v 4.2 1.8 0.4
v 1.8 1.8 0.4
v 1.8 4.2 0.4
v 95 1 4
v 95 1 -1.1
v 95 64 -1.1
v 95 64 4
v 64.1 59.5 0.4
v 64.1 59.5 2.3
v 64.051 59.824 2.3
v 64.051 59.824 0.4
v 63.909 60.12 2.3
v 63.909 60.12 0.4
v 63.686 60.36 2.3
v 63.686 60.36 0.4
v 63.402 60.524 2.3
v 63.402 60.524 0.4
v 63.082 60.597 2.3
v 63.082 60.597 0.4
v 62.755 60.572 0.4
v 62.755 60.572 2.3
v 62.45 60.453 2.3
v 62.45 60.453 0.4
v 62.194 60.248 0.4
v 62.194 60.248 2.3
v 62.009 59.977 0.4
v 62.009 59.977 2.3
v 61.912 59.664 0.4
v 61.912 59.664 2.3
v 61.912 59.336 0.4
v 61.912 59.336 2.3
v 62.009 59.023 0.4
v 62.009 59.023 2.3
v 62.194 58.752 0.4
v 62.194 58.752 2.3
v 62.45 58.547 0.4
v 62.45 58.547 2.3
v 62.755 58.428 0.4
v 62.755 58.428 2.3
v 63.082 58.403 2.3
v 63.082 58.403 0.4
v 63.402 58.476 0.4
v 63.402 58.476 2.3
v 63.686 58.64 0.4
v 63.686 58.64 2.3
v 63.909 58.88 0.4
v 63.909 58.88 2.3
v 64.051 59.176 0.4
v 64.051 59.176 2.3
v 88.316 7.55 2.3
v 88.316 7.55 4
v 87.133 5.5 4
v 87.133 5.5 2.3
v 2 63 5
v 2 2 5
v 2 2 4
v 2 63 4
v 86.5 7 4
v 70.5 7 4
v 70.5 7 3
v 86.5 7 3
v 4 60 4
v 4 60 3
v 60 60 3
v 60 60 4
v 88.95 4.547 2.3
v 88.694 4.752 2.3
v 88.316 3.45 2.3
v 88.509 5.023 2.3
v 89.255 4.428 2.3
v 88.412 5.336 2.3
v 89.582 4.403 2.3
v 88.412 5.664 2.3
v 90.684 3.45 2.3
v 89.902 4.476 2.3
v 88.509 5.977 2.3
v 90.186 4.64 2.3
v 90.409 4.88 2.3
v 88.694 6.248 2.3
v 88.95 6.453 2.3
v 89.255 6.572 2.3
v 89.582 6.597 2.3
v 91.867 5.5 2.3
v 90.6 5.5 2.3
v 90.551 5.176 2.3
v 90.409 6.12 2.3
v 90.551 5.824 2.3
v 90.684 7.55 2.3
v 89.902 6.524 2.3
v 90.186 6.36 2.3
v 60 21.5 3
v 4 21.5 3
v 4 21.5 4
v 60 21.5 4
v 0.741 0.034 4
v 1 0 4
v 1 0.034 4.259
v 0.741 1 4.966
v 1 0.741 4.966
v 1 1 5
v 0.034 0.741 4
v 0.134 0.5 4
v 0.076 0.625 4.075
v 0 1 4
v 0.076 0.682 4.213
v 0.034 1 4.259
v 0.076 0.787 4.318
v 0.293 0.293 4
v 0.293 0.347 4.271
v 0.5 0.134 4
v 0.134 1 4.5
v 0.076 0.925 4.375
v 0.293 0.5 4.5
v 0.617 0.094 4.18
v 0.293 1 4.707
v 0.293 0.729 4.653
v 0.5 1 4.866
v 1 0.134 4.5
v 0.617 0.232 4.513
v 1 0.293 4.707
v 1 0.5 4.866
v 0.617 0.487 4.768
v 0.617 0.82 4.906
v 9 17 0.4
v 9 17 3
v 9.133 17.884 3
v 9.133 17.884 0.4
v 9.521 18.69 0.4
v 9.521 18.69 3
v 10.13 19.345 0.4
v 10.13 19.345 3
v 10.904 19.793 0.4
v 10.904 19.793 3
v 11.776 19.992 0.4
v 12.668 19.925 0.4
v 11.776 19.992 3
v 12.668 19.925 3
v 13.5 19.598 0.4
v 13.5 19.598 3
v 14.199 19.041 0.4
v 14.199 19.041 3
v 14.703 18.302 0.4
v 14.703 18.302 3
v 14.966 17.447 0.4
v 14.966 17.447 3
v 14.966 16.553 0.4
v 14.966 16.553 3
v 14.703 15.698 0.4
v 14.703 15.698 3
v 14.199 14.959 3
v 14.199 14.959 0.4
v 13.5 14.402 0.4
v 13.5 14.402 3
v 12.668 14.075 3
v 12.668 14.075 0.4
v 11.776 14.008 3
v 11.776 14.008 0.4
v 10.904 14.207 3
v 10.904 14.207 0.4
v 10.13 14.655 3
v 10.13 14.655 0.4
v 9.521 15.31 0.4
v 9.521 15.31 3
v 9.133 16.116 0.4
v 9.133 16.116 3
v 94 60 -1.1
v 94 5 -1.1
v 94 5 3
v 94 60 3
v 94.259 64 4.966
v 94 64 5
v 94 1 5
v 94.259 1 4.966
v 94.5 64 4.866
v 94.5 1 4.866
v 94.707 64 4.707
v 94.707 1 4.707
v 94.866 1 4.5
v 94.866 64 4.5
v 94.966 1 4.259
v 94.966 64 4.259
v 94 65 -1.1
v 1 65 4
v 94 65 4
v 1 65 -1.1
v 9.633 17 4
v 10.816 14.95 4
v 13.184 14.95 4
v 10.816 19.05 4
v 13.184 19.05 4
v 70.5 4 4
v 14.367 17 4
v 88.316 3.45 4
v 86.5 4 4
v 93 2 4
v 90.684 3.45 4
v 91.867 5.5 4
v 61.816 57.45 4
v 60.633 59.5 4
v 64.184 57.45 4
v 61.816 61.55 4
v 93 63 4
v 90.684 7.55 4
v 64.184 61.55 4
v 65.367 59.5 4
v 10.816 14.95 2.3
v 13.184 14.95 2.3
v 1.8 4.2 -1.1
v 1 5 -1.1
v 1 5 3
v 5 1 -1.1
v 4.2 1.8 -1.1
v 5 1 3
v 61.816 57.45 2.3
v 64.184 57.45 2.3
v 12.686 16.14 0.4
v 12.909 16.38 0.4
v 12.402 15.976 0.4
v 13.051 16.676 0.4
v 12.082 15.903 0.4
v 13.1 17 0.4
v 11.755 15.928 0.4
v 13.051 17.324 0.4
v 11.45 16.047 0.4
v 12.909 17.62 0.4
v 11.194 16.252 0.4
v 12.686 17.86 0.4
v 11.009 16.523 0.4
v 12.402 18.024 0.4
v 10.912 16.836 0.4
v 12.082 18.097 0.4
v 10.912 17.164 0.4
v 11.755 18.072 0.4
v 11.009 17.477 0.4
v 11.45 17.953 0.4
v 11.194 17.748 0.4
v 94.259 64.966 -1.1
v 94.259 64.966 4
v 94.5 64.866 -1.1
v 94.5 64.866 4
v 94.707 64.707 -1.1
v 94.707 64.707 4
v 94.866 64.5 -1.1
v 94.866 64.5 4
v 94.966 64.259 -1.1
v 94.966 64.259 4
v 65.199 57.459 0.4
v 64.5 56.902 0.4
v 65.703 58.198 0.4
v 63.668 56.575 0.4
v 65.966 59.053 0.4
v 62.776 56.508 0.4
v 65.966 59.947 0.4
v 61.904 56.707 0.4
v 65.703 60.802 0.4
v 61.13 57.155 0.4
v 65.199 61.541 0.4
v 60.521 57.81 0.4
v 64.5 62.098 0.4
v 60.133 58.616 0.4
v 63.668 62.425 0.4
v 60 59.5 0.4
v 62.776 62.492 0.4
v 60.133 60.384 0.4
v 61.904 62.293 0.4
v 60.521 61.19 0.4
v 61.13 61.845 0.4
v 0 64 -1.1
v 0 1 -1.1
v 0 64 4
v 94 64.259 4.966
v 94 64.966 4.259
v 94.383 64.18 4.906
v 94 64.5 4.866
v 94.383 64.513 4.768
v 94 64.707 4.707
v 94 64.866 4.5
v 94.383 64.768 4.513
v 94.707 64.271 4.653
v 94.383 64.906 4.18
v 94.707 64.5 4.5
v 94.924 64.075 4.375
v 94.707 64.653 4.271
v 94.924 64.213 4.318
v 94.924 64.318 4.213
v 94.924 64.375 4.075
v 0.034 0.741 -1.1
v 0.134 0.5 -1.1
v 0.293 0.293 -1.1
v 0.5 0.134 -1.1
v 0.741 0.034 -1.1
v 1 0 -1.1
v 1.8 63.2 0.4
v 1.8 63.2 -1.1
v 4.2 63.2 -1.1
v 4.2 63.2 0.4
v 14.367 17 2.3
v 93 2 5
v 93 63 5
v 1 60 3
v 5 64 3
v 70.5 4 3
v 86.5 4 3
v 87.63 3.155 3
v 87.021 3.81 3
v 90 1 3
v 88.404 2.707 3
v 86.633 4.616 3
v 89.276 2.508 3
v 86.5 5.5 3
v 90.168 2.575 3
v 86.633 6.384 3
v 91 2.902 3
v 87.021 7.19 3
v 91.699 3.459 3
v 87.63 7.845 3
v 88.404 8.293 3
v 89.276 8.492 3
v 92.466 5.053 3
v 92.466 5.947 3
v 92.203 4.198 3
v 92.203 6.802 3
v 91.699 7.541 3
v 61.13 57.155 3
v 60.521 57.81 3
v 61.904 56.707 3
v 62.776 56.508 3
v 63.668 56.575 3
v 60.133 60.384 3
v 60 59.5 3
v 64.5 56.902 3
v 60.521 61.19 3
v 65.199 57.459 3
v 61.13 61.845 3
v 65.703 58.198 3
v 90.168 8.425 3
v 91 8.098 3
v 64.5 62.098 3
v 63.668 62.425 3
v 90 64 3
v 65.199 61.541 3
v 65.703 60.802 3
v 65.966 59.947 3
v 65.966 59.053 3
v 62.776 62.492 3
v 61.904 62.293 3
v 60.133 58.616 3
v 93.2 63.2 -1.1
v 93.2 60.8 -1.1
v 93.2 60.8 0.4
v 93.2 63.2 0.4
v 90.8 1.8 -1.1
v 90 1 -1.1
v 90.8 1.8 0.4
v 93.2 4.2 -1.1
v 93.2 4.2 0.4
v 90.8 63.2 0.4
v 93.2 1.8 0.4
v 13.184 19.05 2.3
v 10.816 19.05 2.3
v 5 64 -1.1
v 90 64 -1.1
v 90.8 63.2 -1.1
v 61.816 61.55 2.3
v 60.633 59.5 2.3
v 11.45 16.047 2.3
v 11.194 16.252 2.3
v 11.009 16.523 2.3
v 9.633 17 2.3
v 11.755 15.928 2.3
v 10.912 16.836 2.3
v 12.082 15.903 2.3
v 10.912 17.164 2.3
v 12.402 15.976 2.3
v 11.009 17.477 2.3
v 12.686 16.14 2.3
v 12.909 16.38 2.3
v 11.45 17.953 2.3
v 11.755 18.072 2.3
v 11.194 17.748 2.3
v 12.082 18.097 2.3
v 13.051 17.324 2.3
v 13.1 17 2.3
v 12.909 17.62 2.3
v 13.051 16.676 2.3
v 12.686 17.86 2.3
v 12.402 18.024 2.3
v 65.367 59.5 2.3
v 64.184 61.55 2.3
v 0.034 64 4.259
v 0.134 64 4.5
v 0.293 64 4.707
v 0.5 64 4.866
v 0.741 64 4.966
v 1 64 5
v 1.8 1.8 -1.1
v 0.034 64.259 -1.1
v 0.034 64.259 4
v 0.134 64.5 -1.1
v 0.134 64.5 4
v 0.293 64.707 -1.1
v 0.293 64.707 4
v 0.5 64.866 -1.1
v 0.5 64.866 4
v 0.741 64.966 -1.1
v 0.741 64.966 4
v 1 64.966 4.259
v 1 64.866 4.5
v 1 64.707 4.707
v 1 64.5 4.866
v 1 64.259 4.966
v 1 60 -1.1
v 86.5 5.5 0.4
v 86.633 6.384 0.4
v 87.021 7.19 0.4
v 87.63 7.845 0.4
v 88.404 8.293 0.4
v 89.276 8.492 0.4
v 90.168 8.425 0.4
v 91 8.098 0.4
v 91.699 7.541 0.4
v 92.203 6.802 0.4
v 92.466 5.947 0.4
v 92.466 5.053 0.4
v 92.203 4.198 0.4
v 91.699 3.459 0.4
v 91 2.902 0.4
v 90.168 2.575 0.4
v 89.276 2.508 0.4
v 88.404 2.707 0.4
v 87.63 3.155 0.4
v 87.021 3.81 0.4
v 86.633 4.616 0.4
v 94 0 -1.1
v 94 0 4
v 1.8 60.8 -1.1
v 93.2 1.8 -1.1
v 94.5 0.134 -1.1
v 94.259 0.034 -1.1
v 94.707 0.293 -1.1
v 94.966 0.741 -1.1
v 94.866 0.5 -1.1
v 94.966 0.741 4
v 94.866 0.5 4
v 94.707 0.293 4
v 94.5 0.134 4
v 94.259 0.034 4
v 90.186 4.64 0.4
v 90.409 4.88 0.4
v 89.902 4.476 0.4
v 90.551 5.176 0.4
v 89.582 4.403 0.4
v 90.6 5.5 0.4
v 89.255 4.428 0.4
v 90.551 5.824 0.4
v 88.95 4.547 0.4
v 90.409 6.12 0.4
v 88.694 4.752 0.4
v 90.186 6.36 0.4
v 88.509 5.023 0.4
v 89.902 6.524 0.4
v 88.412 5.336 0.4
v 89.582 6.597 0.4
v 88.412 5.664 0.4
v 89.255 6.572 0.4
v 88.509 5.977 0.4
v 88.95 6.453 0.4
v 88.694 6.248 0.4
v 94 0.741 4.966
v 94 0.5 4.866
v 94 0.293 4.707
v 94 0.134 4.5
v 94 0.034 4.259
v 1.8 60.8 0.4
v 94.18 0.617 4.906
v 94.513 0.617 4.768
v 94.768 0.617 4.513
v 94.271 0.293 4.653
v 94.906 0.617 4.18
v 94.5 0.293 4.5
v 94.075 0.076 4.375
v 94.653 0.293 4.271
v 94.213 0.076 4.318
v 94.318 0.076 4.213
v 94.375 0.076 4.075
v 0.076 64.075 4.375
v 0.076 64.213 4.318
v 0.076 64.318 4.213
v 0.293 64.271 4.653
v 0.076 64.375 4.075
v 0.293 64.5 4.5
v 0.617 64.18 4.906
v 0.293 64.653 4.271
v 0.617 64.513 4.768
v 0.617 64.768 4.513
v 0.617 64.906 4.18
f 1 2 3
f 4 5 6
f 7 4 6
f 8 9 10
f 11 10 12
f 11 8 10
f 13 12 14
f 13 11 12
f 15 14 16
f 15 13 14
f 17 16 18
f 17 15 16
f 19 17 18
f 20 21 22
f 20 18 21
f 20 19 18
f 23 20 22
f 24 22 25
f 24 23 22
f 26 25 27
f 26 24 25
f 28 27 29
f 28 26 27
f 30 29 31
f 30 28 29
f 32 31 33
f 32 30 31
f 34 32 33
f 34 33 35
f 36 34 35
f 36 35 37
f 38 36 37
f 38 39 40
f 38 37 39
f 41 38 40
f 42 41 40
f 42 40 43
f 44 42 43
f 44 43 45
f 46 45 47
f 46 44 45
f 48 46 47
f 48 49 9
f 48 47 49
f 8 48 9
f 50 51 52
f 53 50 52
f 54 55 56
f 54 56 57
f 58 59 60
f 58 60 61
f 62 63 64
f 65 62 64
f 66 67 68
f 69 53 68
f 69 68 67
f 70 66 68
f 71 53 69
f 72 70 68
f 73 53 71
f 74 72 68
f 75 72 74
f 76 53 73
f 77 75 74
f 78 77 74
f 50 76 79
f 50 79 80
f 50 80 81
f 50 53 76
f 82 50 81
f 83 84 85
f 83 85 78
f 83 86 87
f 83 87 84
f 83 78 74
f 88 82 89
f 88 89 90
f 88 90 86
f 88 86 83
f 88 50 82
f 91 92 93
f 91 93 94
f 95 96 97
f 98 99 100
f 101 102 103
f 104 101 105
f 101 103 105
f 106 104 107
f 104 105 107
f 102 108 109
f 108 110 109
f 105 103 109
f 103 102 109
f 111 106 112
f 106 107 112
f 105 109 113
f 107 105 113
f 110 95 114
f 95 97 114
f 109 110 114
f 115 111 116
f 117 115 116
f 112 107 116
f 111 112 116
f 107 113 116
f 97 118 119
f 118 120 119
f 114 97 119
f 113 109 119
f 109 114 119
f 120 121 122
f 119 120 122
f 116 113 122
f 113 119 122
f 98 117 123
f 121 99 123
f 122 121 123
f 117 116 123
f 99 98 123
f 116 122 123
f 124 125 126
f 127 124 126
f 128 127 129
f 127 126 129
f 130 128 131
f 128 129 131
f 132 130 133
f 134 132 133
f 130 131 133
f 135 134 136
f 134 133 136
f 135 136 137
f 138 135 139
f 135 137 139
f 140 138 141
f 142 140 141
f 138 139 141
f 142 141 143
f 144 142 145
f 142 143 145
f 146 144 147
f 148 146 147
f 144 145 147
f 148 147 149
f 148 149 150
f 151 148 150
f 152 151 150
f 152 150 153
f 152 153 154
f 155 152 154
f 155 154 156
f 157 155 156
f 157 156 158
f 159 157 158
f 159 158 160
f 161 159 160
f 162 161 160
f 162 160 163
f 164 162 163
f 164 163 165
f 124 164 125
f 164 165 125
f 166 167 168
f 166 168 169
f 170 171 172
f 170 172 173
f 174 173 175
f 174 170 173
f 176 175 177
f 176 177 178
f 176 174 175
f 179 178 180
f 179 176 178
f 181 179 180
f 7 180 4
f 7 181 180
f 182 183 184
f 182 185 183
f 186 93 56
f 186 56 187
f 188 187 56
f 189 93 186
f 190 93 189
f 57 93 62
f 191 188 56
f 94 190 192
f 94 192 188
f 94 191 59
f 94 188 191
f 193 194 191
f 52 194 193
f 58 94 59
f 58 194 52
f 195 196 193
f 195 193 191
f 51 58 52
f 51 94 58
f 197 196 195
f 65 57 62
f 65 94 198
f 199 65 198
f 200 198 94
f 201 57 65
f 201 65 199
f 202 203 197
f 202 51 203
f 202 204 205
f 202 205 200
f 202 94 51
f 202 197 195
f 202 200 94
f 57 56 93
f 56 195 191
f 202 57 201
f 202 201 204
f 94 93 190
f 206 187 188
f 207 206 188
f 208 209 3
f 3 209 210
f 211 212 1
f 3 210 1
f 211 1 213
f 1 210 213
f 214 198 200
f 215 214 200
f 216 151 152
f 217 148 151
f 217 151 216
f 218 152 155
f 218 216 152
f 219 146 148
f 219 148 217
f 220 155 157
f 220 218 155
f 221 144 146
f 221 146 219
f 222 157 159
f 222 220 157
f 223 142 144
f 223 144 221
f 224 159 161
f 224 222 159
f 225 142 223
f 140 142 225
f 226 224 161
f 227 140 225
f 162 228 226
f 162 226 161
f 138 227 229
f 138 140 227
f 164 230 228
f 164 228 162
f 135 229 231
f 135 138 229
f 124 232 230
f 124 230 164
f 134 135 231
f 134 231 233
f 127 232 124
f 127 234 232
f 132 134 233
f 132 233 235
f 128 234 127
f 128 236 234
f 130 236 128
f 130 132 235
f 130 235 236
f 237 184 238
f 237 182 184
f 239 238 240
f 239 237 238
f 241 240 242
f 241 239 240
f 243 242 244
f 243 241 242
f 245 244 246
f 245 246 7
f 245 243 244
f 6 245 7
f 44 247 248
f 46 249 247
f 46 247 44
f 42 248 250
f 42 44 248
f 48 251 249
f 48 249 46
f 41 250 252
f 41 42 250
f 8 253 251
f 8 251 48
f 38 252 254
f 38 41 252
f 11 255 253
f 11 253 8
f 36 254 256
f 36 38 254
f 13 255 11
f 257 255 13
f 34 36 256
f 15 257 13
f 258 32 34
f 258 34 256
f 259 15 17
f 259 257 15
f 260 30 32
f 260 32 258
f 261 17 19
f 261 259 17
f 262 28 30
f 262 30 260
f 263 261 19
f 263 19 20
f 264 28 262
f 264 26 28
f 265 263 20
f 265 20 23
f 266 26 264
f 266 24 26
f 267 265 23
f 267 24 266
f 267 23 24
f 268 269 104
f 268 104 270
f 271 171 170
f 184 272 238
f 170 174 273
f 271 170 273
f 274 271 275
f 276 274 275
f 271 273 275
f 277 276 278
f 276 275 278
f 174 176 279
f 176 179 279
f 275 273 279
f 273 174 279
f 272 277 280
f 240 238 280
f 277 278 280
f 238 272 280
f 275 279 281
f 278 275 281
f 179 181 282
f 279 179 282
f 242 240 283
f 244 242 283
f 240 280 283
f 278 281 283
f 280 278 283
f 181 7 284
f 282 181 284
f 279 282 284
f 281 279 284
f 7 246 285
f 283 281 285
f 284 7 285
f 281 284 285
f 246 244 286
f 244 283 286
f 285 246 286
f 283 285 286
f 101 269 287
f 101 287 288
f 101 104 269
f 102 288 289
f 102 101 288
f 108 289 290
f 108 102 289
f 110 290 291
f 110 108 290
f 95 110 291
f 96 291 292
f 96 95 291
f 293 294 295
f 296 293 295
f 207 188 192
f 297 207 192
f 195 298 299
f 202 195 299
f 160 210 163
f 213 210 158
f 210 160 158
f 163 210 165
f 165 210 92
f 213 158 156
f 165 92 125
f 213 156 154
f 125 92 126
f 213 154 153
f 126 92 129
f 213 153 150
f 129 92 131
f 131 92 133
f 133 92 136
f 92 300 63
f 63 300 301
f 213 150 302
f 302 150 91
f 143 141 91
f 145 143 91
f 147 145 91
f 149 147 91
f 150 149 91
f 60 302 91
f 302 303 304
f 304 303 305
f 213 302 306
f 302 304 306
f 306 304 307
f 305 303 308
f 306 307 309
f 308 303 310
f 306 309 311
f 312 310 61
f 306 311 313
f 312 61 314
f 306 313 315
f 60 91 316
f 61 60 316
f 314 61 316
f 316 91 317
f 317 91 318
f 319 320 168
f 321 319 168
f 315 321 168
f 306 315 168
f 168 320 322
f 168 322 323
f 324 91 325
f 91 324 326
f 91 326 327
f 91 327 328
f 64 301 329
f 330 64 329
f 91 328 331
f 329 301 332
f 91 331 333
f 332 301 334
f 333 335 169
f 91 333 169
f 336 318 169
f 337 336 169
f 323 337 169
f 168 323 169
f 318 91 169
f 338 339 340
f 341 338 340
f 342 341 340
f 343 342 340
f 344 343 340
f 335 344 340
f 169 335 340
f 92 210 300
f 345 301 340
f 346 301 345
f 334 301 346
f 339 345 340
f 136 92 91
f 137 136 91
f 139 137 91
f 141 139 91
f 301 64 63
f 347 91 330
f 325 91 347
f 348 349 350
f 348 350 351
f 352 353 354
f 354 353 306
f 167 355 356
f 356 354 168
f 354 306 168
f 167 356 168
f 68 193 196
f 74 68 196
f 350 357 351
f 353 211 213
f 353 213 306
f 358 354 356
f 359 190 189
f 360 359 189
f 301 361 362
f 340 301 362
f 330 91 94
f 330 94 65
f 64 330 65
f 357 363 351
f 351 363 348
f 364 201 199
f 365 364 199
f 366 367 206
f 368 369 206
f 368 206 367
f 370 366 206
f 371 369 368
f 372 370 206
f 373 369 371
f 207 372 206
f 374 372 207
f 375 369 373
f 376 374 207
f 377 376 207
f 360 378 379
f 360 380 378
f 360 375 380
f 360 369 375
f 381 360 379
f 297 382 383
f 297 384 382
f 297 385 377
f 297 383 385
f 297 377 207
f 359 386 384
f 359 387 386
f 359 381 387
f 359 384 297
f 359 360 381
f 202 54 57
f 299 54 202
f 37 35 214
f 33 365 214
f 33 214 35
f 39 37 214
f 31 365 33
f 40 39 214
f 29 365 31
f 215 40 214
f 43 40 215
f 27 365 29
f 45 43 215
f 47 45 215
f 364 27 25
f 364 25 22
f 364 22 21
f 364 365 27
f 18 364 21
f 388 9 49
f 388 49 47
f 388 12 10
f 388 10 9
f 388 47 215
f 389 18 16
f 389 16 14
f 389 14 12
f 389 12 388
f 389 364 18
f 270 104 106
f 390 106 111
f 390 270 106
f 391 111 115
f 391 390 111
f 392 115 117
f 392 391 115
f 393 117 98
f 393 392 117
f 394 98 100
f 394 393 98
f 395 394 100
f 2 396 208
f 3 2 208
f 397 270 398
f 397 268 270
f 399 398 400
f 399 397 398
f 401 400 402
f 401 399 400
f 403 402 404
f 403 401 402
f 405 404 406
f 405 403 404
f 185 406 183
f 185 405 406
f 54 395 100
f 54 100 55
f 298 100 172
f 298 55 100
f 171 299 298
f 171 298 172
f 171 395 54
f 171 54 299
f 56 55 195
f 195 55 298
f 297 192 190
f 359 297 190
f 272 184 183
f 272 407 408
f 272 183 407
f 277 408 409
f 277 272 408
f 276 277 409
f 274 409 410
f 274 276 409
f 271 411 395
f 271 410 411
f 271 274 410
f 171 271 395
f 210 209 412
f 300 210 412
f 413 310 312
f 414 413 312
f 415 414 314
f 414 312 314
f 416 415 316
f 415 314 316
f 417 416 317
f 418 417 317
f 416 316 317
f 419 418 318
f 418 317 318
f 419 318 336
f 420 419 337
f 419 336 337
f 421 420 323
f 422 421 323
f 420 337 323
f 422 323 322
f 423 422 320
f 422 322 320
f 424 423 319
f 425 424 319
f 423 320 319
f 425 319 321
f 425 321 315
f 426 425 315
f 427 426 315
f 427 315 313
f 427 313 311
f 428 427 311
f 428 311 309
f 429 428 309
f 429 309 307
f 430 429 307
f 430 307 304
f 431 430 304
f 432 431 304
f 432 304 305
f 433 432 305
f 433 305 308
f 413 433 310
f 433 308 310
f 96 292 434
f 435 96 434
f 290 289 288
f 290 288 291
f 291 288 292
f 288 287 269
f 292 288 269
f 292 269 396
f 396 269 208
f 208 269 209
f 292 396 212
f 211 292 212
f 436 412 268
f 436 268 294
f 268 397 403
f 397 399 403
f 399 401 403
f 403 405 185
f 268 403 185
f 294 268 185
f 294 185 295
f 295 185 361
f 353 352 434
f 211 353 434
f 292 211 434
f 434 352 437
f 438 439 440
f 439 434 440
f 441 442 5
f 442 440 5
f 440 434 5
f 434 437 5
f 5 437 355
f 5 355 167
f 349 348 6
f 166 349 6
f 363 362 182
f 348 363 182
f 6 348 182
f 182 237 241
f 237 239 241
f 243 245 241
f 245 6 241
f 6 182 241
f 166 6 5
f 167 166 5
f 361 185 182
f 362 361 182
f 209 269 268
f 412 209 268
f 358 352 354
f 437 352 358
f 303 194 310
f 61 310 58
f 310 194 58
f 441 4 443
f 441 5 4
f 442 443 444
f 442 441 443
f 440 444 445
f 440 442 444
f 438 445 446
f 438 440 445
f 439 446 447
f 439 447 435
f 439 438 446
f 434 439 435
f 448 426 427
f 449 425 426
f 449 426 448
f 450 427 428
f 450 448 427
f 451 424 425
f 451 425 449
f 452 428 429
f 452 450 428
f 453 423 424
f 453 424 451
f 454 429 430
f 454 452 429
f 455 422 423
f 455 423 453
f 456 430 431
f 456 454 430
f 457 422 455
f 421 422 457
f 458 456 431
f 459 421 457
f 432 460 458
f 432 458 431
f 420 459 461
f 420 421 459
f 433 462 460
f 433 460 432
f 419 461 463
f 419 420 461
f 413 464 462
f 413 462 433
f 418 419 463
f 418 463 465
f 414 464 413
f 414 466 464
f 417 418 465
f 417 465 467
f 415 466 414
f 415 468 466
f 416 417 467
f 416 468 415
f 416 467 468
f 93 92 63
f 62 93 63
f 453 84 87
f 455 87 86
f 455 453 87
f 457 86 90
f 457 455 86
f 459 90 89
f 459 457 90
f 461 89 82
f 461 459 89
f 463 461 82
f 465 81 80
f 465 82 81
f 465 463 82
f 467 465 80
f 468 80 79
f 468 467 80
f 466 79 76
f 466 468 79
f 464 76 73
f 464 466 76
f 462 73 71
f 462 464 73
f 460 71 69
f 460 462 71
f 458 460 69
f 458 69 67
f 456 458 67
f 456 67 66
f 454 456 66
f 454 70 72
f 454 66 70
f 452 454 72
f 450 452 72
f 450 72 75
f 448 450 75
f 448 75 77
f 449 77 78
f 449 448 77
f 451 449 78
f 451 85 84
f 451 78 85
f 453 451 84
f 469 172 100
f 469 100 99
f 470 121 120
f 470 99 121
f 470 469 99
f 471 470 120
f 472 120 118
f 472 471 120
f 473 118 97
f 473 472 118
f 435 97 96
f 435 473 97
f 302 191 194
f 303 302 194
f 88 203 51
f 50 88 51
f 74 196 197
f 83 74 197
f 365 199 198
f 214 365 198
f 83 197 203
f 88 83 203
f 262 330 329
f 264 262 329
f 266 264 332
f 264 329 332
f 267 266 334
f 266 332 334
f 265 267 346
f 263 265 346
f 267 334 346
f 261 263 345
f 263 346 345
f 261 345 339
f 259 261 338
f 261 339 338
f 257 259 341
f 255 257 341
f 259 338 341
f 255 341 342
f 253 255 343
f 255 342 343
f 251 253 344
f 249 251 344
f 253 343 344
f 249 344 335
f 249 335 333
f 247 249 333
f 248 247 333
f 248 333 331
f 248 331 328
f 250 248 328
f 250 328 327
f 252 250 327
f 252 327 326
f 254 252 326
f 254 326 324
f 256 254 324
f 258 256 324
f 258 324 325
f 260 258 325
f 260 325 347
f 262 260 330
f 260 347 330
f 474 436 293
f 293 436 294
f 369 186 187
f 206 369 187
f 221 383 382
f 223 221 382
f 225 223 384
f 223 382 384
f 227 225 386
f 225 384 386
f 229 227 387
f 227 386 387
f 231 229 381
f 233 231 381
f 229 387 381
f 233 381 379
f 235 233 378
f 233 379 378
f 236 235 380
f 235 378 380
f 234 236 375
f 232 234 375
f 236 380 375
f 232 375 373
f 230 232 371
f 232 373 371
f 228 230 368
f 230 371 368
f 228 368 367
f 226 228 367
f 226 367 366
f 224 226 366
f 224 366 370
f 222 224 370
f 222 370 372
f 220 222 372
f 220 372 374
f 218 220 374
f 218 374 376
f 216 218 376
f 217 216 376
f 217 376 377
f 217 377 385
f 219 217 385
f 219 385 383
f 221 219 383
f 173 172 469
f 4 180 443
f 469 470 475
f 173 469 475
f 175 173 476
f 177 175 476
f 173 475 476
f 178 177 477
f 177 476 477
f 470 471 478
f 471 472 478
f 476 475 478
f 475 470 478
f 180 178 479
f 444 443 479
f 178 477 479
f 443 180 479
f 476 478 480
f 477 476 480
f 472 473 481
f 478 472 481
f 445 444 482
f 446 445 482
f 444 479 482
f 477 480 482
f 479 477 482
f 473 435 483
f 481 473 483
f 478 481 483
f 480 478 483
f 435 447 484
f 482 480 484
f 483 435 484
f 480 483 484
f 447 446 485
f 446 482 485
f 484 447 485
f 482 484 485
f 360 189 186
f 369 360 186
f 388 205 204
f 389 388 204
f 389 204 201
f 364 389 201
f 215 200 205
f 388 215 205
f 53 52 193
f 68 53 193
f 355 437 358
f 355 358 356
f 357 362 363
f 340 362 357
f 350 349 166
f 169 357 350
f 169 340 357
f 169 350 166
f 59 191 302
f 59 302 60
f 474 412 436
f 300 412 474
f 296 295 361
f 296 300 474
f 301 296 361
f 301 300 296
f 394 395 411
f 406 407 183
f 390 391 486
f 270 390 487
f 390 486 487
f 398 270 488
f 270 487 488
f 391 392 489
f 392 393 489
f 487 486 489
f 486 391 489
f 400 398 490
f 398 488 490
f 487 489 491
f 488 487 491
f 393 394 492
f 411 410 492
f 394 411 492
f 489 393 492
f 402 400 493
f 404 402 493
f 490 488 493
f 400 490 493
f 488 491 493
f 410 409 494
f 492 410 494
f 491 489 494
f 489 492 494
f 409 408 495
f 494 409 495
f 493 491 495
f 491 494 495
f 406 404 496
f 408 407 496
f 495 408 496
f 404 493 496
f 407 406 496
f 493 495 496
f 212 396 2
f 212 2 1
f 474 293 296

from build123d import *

# Parameters (mm, degrees)
EXTRUDE_346_DEPTH           = 5
EXTRUDE_346_DEPTH_BACK      = 1.1
SKETCH_2_W                  = 95
SKETCH_2_H                  = 65
SKETCH_3_W                  = 56
SKETCH_3_H                  = 38.5
CUT_EXTRUDE_448_DEPTH       = 5
CUT_EXTRUDE_527_DEPTH       = 3
CUT_EXTRUDE_527_DEPTH_BACK  = 1.1
SKETCH_4_W                  = 93
SKETCH_4_H                  = 63
CUT_EXTRUDE_START           = 5
SKETCH_5_W                  = 91
SKETCH_5_H                  = 61
CUT_EXTRUDE_612_DEPTH       = 1
CUT_EXTRUDE_START_2         = 4
SKETCH_6_W                  = 16
SKETCH_6_H                  = 3
CUT_EXTRUDE_697_DEPTH       = 1
WRAP_1_OUTLINE_R            = 3
WRAP_1_DEPTH                = 2.6
SKETCH_13_R                 = 1.1
CUT_EXTRUDE_1_DEPTH         = 116.221569161
SKETCH_15_R                 = 3
EXTRUDE_2_DEPTH             = 2.6
OTHER_START                 = 0.4
OTHER_2_OUTLINE_R           = 1.1
OTHER_2_DEPTH               = 3.6
SKETCH_16_R                 = 3
EXTRUDE_3_DEPTH             = 2.6
OTHER_3_OUTLINE_R           = 1.1
OTHER_3_DEPTH               = 3.6
EXTRUDE_1_DEPTH             = 4.1
EXTRUDE_2_2_DEPTH           = 4.1
EXTRUDE_3_2_DEPTH           = 4.1
EXTRUDE_4_DEPTH             = 4.1
CUT_EXTRUDE_3053_DEPTH      = 0.4
CUT_EXTRUDE_3053_DEPTH_BACK = 1.1
SKETCH_21_W                 = 91.4
SKETCH_21_H                 = 61.4
CUT_EXTRUDE_1_2_DEPTH       = 1.7
CUT_EXTRUDE_2_DEPTH         = 1.7
CUT_EXTRUDE_3_DEPTH         = 1.7
FILLET_1_R                  = 1
FILLET_2_R                  = 1
FILLET_3_R                  = 1
FILLET_4_R                  = 1


# Read off the part's stored shape, not the designer's step: Стойка1, Отверстие2, Отверстие3
with BuildPart() as part:
    # Эскиз2 → Extrude 346 (new, two sides: drawn at the far end of the back side and taken through both)
    with BuildSketch(Plane.XY.offset(-EXTRUDE_346_DEPTH_BACK)):
        with Locations((47.5, 32.5)):
            Rectangle(SKETCH_2_W, SKETCH_2_H)
    extrude(amount=EXTRUDE_346_DEPTH + EXTRUDE_346_DEPTH_BACK)

    # Эскиз3 → Cut-Extrude 448 (cut)
    with BuildSketch(Plane.XY):
        with Locations((32, 40.75)):
            Rectangle(SKETCH_3_W, SKETCH_3_H)
    extrude(amount=CUT_EXTRUDE_448_DEPTH, mode=Mode.SUBTRACT)

    # Эскиз4 → Cut-Extrude 527 (cut, two sides: drawn at the far end of the back side and taken through both)
    with BuildSketch(Plane.XY.offset(-CUT_EXTRUDE_527_DEPTH_BACK)):
        with Locations((47.5, 32.5)):
            Rectangle(SKETCH_4_W, SKETCH_4_H)
    extrude(amount=CUT_EXTRUDE_527_DEPTH + CUT_EXTRUDE_527_DEPTH_BACK, mode=Mode.SUBTRACT)

    # Эскиз5 → Cut-Extrude 612 (cut)
    with BuildSketch(Plane.XY.offset(CUT_EXTRUDE_START)):
        with Locations((47.5, 32.5)):
            Rectangle(SKETCH_5_W, SKETCH_5_H)
    extrude(amount=-CUT_EXTRUDE_612_DEPTH, mode=Mode.SUBTRACT)

    # Эскиз6 → Cut-Extrude 697 (cut)
    with BuildSketch(Plane.XY.offset(CUT_EXTRUDE_START_2)):
        with Locations((78.5, 5.5)):
            Rectangle(SKETCH_6_W, SKETCH_6_H)
    extrude(amount=-CUT_EXTRUDE_697_DEPTH, mode=Mode.SUBTRACT)

    # Стойка1 outline → Стойка1 (add)
    with BuildSketch(Plane(origin=(0, 0, 3), x_dir=(-1, 0, 0), z_dir=(0, 0, -1))):
        with Locations((-12, 17)):
            Circle(WRAP_1_OUTLINE_R)
    extrude(amount=WRAP_1_DEPTH)

    # Эскиз13 → Cut-Extrude 1 (cut, through all)
    with BuildSketch(Plane.XY.offset(4)):
        with Locations((12, 17)):
            Circle(SKETCH_13_R)
    extrude(amount=-CUT_EXTRUDE_1_DEPTH, mode=Mode.SUBTRACT)

    # Эскиз15 → Extrude 2 (add)
    with BuildSketch(Plane(origin=(0, 0, 3), x_dir=(-1, 0, 0), z_dir=(0, 0, -1))):
        with Locations((-63, 59.5)):
            Circle(SKETCH_15_R)
    extrude(amount=EXTRUDE_2_DEPTH)

    # Отверстие2 outline → Отверстие2 (cut)
    with BuildSketch(Plane.XY.offset(OTHER_START)):
        with Locations((63, 59.5)):
            Circle(OTHER_2_OUTLINE_R)
    extrude(amount=OTHER_2_DEPTH, mode=Mode.SUBTRACT)

    # Эскиз16 → Extrude 3 (add)
    with BuildSketch(Plane(origin=(0, 0, 3), x_dir=(-1, 0, 0), z_dir=(0, 0, -1))):
        with Locations((-89.5, 5.5)):
            Circle(SKETCH_16_R)
    extrude(amount=EXTRUDE_3_DEPTH)

    # Отверстие3 outline → Отверстие3 (cut)
    with BuildSketch(Plane.XY.offset(OTHER_START)):
        with Locations((89.5, 5.5)):
            Circle(OTHER_3_OUTLINE_R)
    extrude(amount=OTHER_3_DEPTH, mode=Mode.SUBTRACT)

    # Эскиз22 → Угол1 (add)
    with BuildSketch(Plane(origin=(0, 0, 3), x_dir=(-1, 0, 0), z_dir=(0, 0, -1))):
        Polygon((-1, 64), (-1, 60), (-5, 64), align=None)
    extrude(amount=EXTRUDE_1_DEPTH)

    # Эскиз20 → Extrude 2 2 (add)
    with BuildSketch(Plane(origin=(0, 0, 3), x_dir=(-1, 0, 0), z_dir=(0, 0, -1))):
        Polygon((-1, 1), (-1, 5), (-5, 1), align=None)
    extrude(amount=EXTRUDE_2_2_DEPTH)

    # Эскиз23 → Extrude 3 2 (add)
    with BuildSketch(Plane(origin=(0, 0, 3), x_dir=(-1, 0, 0), z_dir=(0, 0, -1))):
        Polygon((-94, 1), (-90, 1), (-94, 5), align=None)
    extrude(amount=EXTRUDE_3_2_DEPTH)

    # Эскиз24 → Угол4 (add)
    with BuildSketch(Plane(origin=(0, 0, 3), x_dir=(-1, 0, 0), z_dir=(0, 0, -1))):
        Polygon((-94, 64), (-90, 64), (-94, 60), align=None)
    extrude(amount=EXTRUDE_4_DEPTH)

    # Эскиз21 → Cut-Extrude 3053 (cut, two sides: drawn at the far end of the back side and taken through both)
    with BuildSketch(Plane.XY.offset(-CUT_EXTRUDE_3053_DEPTH_BACK)):
        with Locations((47.5, 32.5)):
            Rectangle(SKETCH_21_W, SKETCH_21_H)
    extrude(amount=CUT_EXTRUDE_3053_DEPTH + CUT_EXTRUDE_3053_DEPTH_BACK, mode=Mode.SUBTRACT)

    # Эскиз25 → Cut-Extrude 1 2 (cut)
    with BuildSketch(Plane.XY.offset(4)):
        Polygon((9.632863896, 17), (10.816431948, 14.95), (13.183568052, 14.95), (14.367136104, 17), (13.183568052, 19.05), (10.816431948, 19.05), align=None)
    extrude(amount=-CUT_EXTRUDE_1_2_DEPTH, mode=Mode.SUBTRACT)

    # Эскиз27 → Гайка2 (cut)
    with BuildSketch(Plane.XY.offset(4)):
        Polygon((65.367136104, 59.5), (64.183568052, 61.55), (61.816431948, 61.55), (60.632863896, 59.5), (61.816431948, 57.45), (64.183568052, 57.45), align=None)
    extrude(amount=-CUT_EXTRUDE_2_DEPTH, mode=Mode.SUBTRACT)

    # Эскиз28 → Гайка3 (cut)
    with BuildSketch(Plane.XY.offset(4)):
        Polygon((91.867136104, 5.5), (90.683568052, 7.55), (88.316431948, 7.55), (87.132863896, 5.5), (88.316431948, 3.45), (90.683568052, 3.45), align=None)
    extrude(amount=-CUT_EXTRUDE_3_DEPTH, mode=Mode.SUBTRACT)

    # Скругление1
    fillet_1_edges = [part.edges().sort_by_distance(p)[0] for p in [
        (47.5, 65, 5),
    ]]
    fillet(fillet_1_edges, radius=FILLET_1_R)

    # Скругление2
    fillet_2_edges = [part.edges().sort_by_distance(p)[0] for p in [
        (95, 32, 5),
        (95, 64.707106781, 4.707106781),
        (95, 65, 1.45),
    ]]
    fillet(fillet_2_edges, radius=FILLET_2_R)

    # Скругление3
    fillet_3_edges = [part.edges().sort_by_distance(p)[0] for p in [
        (47, 0, 5),
        (94.707106781, 0, 4.707106781),
        (95, 0, 1.45),
    ]]
    fillet(fillet_3_edges, radius=FILLET_3_R)

    # Скругление4
    fillet_4_edges = [part.edges().sort_by_distance(p)[0] for p in [
        (0, 32.5, 5),
        (0, 64.707106781, 4.707106781),
        (0, 0.292893219, 4.707106781),
        (0, 65, 1.45),
        (0, 0, 1.45),
    ]]
    fillet(fillet_4_edges, radius=FILLET_4_R)


solid = part.part
